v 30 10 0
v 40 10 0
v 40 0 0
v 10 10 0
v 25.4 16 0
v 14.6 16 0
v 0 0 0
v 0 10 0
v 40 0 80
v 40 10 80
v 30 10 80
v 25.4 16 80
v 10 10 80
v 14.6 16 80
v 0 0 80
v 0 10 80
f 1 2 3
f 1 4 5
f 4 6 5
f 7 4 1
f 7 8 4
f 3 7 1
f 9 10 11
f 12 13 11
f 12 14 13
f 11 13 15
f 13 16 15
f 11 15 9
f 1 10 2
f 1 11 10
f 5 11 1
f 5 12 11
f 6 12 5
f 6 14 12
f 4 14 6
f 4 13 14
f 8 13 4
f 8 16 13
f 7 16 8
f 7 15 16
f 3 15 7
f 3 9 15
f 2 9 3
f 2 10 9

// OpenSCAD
$fn = 32;

// ----------------------------------------------------------------------
// V guide rail: dovetail, 40 mm wide
// ----------------------------------------------------------------------

// --- parameters (mm) ---
rail_w = 40;              // rail width, X
base_t = 10;              // base plate thickness
v_depth = 6;              // V feature depth / height
v_half_w = 10;            // half width of the V at the base face
plate_t = 80;             // rail length, Z (the extrusion height)
top_half_w = 5.4;         // half width at the dovetail top

dovetail_base = 2 * v_half_w;  // dovetail width at the base
dovetail_top = 2 * top_half_w;  // dovetail width at the top

profile = [[0, 0], [40, 0], [40, 10], [30, 10], [25.4, 16], [14.6, 16], [10, 10], [0, 10]];  // primary outline, 8 points, counter clockwise

// --- the one profile operation ---
linear_extrude(height = plate_t) polygon(points = profile);
